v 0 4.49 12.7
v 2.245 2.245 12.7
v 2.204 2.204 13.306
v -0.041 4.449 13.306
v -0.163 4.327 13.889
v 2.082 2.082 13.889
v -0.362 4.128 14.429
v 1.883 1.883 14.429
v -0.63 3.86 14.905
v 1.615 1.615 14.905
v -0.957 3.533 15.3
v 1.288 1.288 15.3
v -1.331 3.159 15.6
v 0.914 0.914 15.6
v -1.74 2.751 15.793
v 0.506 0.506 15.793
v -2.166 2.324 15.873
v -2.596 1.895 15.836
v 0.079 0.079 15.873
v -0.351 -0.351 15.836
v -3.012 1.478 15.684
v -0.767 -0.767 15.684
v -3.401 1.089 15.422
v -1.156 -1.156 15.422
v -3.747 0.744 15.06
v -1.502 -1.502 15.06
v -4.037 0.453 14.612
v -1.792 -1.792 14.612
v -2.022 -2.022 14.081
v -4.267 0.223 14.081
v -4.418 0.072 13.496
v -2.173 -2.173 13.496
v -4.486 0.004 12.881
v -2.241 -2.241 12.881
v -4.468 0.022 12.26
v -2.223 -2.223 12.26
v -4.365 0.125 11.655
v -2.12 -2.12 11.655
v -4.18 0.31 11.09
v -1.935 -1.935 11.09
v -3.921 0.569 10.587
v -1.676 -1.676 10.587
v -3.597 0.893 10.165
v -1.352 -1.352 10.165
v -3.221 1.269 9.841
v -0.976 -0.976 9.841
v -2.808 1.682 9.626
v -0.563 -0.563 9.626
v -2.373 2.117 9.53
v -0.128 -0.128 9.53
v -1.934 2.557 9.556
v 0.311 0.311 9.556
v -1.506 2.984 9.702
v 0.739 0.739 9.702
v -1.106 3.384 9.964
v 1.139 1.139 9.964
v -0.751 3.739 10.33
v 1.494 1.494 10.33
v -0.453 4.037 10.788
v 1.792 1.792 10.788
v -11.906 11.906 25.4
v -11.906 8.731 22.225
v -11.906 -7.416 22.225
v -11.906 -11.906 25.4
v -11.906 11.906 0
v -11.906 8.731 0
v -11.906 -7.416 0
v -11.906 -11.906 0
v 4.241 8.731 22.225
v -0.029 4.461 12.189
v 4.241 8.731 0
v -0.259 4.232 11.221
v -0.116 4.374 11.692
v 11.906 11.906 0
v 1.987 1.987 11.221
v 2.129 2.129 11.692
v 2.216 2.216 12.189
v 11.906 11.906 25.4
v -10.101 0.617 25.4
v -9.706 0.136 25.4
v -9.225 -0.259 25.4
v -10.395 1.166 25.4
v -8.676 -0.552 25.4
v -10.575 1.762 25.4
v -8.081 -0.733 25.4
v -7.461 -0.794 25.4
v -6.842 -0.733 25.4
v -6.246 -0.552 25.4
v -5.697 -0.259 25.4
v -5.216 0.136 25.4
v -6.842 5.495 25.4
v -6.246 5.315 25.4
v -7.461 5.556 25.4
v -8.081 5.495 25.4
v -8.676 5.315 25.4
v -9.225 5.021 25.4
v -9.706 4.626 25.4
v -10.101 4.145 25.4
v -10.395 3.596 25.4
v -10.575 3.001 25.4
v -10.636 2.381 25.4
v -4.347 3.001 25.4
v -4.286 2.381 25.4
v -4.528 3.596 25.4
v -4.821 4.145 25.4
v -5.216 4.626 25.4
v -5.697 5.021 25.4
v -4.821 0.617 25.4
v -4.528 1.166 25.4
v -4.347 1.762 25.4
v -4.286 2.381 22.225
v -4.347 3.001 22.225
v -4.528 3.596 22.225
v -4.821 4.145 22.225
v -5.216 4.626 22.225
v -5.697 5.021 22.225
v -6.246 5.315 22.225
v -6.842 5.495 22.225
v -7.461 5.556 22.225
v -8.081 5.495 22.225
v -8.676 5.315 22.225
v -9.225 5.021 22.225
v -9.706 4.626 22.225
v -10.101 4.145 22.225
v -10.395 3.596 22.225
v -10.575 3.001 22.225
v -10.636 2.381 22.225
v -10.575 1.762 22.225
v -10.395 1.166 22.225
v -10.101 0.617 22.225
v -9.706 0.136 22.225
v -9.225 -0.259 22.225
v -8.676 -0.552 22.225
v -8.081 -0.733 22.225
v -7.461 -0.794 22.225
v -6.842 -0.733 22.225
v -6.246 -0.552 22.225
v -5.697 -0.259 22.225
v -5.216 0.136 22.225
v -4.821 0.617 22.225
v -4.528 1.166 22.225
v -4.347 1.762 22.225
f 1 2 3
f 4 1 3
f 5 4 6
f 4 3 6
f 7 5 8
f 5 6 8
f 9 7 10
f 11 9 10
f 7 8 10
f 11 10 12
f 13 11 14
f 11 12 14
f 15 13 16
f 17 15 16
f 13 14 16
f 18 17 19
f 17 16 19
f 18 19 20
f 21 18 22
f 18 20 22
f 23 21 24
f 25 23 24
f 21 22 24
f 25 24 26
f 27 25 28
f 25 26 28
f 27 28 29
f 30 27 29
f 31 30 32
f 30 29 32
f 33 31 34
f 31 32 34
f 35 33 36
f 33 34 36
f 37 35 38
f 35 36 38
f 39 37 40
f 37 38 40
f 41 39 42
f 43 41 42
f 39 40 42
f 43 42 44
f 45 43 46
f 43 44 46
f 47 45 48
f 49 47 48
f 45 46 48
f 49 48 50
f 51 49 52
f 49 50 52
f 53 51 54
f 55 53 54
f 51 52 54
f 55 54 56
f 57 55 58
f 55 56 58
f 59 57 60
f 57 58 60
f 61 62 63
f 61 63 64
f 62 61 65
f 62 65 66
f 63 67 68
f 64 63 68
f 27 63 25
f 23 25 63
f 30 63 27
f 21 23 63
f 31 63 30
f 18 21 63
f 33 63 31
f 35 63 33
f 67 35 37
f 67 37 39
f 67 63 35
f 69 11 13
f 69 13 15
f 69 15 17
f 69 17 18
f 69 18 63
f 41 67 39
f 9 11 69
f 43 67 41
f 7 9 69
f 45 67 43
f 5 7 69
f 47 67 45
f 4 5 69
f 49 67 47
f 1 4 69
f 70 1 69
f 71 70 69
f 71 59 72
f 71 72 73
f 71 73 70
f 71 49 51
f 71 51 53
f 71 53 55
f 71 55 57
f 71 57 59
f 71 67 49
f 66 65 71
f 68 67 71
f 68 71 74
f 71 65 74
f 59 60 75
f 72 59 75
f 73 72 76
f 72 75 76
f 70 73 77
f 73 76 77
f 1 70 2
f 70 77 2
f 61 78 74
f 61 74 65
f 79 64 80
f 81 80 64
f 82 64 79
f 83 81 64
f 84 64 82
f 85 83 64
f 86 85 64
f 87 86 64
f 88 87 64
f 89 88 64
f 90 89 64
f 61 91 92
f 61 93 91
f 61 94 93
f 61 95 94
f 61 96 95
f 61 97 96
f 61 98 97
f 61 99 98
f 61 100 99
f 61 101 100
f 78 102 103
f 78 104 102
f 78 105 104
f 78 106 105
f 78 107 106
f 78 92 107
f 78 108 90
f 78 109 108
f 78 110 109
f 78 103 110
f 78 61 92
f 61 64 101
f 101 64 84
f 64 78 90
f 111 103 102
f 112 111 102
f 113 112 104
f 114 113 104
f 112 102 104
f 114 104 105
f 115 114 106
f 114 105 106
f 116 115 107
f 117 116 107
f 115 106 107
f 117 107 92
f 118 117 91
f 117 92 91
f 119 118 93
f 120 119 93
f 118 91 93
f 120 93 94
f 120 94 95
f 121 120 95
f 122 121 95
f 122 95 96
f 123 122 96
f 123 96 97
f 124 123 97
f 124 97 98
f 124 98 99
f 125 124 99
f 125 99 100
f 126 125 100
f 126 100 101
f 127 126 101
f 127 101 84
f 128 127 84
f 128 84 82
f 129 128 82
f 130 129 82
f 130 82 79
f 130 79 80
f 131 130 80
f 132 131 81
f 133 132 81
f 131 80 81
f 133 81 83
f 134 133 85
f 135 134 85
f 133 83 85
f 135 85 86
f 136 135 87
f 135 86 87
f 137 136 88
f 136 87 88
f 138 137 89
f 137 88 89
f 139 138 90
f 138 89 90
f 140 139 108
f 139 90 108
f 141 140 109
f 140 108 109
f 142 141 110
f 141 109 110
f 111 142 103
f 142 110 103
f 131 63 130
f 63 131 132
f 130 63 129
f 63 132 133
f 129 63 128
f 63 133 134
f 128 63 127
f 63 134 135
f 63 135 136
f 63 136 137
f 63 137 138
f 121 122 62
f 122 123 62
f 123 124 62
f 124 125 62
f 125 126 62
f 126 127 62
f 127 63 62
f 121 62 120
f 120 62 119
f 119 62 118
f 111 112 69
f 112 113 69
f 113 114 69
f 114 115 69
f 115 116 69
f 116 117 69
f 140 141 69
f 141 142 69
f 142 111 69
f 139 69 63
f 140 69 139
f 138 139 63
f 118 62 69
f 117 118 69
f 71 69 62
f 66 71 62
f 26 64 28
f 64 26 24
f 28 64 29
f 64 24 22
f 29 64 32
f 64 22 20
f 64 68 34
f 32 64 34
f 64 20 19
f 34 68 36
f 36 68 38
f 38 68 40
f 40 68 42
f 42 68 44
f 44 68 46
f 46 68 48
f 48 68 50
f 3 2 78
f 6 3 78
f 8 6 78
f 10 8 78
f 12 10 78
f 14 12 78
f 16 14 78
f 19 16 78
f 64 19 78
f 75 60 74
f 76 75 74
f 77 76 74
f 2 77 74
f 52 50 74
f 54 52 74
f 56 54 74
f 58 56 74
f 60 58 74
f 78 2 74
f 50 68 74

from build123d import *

# Parameters (mm, degrees)
F1_DEPTH = 25.4
F2_T     = -3.175
F3_DEPTH = 25.4
F5_DEPTH = 3.175
F6_R     = 3.175
F7_DEPTH = 25.4
F9_DEPTH = 3.175


# Not quite as in the source:
# - a feature names something its author has since deleted; it is built from what else it names


with BuildPart() as f1:
    # F0 (on Top) → F1 (new body)
    with BuildSketch(Plane.XY):
        Polygon((11.90625, 11.90625), (-11.90625, 11.90625), (-11.90625, -11.90625), align=None)
    extrude(amount=F1_DEPTH)

    # F2
    f2_openings = [f1.faces().sort_by_distance(p)[0] for p in [
        (-11.90625, 0, 12.7),
    ]]
    offset(amount=F2_T, openings=f2_openings)

    # F3 (cut): a face of the model
    f3_faces = [f1.faces().sort_by_distance(p)[0] for p in [
        (-6.5237926868, 3.3487926868, 3.175),
    ]]
    extrude(f3_faces, amount=-F3_DEPTH, mode=Mode.SUBTRACT)

    # F4 (on face) → F5 (cut)
    with BuildSketch(Plane(origin=(-11.90625, 0, 0), x_dir=(0, -1, 0), z_dir=(-1, 0, 0))):
        with BuildLine():
            ThreePointArc((3.175, 12.7), (2.9133467904, 13.962155093), (2.1715130842, 15.0162806231))
            Line((2.1715130842, 15.0162806231), (0, 12.7))
            Line((0, 12.7), (2.1715130842, 10.3837193769))
            ThreePointArc((2.1715130842, 10.3837193769), (2.9133467904, 11.437844907), (3.175, 12.7))
        make_face()
        with BuildLine():
            Line((0, 12.7), (2.1715130842, 15.0162806231))
            ThreePointArc((2.1715130842, 15.0162806231), (0, 15.875), (-2.1715130842, 15.0162806231))
            Line((-2.1715130842, 15.0162806231), (0, 12.7))
        make_face()
        with BuildLine():
            Line((-2.1715130842, 10.3837193769), (0, 12.7))
            Line((0, 12.7), (-2.1715130842, 15.0162806231))
            ThreePointArc((-2.1715130842, 15.0162806231), (-3.175, 12.7), (-2.1715130842, 10.3837193769))
        make_face()
        with BuildLine():
            Line((2.1715130842, 10.3837193769), (0, 12.7))
            Line((0, 12.7), (-2.1715130842, 10.3837193769))
            ThreePointArc((-2.1715130842, 10.3837193769), (0, 9.525), (2.1715130842, 10.3837193769))
        make_face()
    extrude(amount=-F5_DEPTH, mode=Mode.SUBTRACT)

    # F6 (on face) → F7 (cut)
    with BuildSketch(Plane.XY.offset(25.4)):
        with Locations((-7.46125, 2.38125)):
            Circle(F6_R)
    extrude(amount=-F7_DEPTH, mode=Mode.SUBTRACT)

    # F8 (on face) → F9 (cut)
    with BuildSketch(Plane(origin=(0, 0, 0), x_dir=(0.7071067812, 0.7071067812, 0), z_dir=(0.7071067812, -0.7071067812, 0))):
        with BuildLine():
            ThreePointArc((3.175, 12.7), (1.0081076412, 15.7107048982), (-2.5348229819, 14.6118832209))
            Line((-2.5348229819, 14.6118832209), (2.5348229819, 10.7881167791))
            ThreePointArc((2.5348229819, 10.7881167791), (3.0107048982, 11.6918923588), (3.175, 12.7))
        make_face()
        with BuildLine():
            Line((2.5348229819, 10.7881167791), (-2.5348229819, 14.6118832209))
            ThreePointArc((-2.5348229819, 14.6118832209), (-1.9118832209, 10.1651770181), (2.5348229819, 10.7881167791))
        make_face()
    extrude(amount=-F9_DEPTH, mode=Mode.SUBTRACT)


solid = f1.part
